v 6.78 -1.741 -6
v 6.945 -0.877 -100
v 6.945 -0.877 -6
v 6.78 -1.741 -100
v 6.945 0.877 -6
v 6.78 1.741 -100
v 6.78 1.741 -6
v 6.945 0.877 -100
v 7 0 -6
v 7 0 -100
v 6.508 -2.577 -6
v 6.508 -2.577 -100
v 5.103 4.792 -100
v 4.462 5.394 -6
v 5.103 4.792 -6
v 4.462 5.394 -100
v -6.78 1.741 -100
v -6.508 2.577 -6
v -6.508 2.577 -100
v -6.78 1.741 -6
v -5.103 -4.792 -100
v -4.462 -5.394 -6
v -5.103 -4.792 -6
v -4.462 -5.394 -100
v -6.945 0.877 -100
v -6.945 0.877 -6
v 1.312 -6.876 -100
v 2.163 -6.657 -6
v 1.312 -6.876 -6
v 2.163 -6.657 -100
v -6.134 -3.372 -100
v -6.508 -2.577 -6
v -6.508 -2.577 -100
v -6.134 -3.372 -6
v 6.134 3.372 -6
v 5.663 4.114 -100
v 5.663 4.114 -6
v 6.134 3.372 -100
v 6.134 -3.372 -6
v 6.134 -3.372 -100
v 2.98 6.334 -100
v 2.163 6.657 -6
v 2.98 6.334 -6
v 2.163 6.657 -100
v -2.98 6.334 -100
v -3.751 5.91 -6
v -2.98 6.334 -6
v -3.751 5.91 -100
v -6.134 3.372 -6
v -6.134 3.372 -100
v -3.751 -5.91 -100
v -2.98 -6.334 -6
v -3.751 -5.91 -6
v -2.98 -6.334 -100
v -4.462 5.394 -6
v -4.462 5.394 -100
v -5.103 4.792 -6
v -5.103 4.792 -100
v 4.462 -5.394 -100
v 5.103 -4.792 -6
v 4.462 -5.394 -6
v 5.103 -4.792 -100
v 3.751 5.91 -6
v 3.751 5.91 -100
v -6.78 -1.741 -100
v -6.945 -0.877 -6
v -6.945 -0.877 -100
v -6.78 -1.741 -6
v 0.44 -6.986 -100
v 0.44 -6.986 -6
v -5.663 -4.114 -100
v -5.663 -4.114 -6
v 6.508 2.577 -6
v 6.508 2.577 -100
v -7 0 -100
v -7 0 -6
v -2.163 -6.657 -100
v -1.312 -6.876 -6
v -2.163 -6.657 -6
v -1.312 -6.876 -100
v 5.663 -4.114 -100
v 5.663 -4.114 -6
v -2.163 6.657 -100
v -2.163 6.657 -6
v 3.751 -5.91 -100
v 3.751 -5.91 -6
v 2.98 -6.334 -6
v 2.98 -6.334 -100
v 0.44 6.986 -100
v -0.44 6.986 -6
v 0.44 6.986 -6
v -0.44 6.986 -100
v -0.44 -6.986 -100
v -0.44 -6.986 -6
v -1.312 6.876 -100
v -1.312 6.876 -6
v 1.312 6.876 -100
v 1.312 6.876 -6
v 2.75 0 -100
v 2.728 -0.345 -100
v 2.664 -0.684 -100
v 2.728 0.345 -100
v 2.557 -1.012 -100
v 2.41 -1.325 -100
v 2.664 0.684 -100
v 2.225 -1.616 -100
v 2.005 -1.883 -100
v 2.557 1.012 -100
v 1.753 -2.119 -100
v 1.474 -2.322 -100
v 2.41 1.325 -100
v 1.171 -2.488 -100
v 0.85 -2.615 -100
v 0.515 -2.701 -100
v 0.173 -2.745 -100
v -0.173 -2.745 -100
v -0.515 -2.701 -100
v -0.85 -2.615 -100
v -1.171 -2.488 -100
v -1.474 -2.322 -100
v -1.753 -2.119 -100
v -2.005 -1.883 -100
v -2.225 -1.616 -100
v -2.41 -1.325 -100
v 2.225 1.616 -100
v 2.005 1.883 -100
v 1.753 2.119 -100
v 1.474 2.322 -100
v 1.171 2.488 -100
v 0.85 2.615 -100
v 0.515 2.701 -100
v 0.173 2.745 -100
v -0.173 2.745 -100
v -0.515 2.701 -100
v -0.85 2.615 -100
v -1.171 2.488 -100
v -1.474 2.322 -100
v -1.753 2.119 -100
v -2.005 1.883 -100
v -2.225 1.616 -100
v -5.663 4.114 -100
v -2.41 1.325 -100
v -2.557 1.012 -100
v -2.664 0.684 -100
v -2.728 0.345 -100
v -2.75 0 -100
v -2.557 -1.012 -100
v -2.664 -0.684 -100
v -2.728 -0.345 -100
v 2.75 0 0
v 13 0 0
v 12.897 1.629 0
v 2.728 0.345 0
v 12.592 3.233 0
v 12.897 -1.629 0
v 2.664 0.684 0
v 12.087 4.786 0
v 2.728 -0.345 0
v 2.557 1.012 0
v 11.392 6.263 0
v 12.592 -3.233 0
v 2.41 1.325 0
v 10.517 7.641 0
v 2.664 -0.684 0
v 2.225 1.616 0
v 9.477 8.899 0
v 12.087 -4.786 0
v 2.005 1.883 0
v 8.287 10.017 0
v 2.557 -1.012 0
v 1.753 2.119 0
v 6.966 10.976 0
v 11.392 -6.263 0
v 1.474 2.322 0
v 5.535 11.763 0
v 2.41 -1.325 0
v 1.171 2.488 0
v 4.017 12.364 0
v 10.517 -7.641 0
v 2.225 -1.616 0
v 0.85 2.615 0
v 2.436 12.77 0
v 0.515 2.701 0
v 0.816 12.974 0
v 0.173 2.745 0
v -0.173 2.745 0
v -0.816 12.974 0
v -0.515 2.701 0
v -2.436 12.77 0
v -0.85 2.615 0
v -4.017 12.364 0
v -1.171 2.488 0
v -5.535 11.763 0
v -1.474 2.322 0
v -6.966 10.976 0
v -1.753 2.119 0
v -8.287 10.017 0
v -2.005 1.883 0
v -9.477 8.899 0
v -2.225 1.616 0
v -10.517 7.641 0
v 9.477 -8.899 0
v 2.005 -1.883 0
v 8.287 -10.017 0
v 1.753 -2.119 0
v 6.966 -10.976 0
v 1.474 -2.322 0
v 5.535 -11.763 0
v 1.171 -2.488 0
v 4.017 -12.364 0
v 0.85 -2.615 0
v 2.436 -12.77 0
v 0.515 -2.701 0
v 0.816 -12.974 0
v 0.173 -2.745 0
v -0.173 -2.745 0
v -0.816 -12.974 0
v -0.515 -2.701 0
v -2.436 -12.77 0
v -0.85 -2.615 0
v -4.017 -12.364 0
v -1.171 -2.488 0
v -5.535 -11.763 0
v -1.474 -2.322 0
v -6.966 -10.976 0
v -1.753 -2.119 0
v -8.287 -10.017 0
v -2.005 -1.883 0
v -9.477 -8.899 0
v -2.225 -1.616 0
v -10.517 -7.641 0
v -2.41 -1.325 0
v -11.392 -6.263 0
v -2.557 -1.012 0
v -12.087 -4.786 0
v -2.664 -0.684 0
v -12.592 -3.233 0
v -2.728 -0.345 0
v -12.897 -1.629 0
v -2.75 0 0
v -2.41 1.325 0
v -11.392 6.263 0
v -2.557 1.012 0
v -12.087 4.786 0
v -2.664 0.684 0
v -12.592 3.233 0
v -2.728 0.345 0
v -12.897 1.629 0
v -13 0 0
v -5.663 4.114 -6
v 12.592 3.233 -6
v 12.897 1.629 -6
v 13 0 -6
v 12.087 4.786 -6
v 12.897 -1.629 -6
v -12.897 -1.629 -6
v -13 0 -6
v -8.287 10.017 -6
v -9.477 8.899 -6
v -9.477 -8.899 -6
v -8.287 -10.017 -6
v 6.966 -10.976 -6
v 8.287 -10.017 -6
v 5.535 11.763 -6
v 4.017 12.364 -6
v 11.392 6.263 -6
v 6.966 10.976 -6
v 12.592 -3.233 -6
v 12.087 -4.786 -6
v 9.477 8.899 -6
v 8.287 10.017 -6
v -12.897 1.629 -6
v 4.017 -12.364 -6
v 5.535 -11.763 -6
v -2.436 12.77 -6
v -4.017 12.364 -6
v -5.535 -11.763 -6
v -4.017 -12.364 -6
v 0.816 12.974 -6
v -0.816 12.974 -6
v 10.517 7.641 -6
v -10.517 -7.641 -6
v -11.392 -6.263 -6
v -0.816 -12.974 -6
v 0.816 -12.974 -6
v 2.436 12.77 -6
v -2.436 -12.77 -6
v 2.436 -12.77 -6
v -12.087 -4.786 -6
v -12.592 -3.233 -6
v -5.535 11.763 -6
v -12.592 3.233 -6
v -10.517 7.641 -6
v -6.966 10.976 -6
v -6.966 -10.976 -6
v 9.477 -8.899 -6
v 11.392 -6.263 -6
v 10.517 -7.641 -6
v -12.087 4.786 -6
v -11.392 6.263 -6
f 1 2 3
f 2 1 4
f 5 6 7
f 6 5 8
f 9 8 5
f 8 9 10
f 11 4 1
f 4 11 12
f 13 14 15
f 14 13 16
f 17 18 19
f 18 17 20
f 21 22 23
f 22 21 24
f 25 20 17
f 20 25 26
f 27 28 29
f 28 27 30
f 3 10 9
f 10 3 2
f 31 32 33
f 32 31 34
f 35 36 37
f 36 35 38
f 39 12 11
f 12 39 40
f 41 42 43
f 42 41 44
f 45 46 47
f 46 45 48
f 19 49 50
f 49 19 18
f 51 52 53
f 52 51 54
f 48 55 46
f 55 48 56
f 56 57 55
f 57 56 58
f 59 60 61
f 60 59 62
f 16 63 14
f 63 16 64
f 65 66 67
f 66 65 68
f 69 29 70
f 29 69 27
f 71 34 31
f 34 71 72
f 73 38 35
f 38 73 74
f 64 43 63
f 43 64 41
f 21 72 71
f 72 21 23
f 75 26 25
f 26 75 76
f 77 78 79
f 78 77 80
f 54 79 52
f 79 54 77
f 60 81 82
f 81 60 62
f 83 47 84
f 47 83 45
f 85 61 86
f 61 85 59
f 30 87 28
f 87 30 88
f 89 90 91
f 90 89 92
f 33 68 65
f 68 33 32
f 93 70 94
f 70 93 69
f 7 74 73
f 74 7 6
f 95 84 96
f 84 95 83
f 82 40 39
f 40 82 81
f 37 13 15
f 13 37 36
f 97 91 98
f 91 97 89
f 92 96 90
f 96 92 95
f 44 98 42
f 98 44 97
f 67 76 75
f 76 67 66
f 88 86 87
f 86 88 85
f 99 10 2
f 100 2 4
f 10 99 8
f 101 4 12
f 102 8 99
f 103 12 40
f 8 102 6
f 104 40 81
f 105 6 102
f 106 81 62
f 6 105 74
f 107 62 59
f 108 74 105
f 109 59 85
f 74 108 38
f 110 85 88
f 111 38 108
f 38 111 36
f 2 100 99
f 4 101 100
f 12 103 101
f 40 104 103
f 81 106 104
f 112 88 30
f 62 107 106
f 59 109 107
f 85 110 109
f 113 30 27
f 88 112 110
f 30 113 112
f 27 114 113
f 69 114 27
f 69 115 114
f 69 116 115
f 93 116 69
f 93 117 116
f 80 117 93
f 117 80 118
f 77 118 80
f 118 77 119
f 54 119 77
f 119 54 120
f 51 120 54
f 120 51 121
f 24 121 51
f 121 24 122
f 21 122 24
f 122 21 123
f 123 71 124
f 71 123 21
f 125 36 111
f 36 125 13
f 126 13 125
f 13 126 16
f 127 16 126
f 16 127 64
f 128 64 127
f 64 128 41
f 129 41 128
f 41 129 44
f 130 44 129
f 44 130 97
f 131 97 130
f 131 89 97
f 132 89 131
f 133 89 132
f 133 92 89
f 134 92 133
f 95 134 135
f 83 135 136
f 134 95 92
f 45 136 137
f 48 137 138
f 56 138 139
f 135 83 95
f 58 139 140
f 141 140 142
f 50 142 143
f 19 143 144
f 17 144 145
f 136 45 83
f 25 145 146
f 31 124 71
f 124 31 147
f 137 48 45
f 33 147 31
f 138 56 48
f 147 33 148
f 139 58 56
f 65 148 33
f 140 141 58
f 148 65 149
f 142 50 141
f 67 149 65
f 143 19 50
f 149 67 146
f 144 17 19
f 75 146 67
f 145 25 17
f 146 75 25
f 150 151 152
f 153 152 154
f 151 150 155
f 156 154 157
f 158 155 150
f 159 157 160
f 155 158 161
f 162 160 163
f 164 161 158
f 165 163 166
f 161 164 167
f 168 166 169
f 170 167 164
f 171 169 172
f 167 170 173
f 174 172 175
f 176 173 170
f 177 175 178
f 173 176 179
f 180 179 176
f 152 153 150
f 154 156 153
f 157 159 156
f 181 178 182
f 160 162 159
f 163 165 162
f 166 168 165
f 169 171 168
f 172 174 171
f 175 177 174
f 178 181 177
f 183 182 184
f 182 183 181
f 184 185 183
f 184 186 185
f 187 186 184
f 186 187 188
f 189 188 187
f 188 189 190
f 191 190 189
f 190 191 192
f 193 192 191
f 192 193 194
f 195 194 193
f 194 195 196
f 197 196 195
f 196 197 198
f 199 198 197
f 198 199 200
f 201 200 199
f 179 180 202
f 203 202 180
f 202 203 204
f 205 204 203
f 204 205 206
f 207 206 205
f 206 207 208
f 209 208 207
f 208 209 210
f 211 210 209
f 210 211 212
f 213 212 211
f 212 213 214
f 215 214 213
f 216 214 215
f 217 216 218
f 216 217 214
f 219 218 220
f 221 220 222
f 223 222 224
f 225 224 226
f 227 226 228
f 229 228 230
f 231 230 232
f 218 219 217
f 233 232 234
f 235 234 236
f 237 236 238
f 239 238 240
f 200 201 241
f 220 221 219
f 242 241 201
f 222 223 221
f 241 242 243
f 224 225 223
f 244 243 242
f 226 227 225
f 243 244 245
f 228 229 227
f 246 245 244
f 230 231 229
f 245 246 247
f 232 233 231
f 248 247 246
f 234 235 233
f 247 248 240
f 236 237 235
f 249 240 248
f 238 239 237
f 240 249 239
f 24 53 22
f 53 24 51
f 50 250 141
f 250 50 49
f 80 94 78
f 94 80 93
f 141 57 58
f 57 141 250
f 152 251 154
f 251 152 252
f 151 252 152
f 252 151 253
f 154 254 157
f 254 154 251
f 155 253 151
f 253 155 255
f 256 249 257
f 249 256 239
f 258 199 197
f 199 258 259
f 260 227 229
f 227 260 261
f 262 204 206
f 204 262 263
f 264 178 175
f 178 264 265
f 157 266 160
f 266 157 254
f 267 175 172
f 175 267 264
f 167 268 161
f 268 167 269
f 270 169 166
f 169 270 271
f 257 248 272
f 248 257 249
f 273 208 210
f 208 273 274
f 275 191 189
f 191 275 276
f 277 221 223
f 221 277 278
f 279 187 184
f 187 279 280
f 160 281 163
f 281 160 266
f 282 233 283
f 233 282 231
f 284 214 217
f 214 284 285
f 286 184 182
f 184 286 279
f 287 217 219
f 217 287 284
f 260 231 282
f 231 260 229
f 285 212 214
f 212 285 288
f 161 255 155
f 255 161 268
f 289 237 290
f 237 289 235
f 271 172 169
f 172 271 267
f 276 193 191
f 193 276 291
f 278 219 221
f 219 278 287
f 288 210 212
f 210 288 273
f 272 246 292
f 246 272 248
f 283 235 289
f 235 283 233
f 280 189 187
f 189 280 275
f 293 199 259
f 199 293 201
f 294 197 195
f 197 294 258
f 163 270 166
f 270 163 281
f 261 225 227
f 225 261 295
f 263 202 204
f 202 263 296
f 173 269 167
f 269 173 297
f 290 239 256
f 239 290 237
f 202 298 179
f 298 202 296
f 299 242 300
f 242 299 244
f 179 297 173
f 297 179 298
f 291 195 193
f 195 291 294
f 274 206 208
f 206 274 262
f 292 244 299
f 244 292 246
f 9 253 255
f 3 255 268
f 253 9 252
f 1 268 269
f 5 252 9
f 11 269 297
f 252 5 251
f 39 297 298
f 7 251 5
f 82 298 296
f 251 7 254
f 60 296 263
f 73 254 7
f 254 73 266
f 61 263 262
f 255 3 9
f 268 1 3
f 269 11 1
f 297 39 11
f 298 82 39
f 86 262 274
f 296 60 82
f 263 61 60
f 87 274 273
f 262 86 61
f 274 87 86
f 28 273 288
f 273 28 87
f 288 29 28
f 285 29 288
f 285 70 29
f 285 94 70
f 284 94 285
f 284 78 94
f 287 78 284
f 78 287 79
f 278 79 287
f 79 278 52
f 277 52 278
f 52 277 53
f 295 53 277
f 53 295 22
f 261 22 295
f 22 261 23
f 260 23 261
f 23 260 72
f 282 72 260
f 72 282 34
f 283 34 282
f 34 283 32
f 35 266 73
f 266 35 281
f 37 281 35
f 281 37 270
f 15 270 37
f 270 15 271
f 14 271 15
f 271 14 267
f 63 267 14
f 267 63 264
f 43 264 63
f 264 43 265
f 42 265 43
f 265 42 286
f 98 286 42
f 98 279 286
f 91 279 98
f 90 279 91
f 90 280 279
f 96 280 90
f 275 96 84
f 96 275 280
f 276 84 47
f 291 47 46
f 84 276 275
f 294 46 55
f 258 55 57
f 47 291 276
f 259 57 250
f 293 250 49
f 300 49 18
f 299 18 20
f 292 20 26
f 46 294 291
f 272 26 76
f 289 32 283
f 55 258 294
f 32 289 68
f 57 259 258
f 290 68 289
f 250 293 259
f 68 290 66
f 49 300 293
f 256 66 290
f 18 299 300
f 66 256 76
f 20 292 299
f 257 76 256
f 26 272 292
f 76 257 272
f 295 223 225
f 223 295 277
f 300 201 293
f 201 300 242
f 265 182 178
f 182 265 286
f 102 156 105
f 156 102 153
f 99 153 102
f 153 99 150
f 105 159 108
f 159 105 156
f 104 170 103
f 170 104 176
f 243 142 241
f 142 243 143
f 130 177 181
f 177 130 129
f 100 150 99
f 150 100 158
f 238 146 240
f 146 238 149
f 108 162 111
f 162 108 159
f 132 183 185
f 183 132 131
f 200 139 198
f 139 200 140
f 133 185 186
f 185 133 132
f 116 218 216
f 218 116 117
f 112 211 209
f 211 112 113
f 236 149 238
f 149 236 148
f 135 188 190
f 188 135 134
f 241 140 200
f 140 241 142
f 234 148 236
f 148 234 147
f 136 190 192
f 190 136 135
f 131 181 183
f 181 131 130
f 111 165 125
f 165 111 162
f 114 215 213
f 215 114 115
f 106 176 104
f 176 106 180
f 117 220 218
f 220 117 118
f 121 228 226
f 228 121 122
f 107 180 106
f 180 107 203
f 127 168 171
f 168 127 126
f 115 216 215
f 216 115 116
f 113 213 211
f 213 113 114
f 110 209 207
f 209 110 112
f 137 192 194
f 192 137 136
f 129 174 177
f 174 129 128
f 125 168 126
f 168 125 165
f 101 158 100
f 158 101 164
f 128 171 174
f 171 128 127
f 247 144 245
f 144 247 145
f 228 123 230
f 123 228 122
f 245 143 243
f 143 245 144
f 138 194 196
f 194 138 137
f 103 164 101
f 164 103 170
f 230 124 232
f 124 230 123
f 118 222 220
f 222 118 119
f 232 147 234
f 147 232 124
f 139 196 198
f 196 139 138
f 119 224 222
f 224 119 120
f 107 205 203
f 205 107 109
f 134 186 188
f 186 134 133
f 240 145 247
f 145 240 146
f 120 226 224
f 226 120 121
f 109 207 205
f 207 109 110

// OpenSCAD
$fn = 50;


difference() {
	union() {
		translate(v = [0, 0, -100.0000000000]) {
			cylinder(h = 100, r = 7.0000000000);
		}
		translate(v = [0, 0, -6.0000000000]) {
			cylinder(h = 6, r = 13.0000000000);
		}
	}
	union() {
		#translate(v = [0, 0, -100]) {
			cylinder(h = 100, r = 2.7500000000);
		}
	}
}
